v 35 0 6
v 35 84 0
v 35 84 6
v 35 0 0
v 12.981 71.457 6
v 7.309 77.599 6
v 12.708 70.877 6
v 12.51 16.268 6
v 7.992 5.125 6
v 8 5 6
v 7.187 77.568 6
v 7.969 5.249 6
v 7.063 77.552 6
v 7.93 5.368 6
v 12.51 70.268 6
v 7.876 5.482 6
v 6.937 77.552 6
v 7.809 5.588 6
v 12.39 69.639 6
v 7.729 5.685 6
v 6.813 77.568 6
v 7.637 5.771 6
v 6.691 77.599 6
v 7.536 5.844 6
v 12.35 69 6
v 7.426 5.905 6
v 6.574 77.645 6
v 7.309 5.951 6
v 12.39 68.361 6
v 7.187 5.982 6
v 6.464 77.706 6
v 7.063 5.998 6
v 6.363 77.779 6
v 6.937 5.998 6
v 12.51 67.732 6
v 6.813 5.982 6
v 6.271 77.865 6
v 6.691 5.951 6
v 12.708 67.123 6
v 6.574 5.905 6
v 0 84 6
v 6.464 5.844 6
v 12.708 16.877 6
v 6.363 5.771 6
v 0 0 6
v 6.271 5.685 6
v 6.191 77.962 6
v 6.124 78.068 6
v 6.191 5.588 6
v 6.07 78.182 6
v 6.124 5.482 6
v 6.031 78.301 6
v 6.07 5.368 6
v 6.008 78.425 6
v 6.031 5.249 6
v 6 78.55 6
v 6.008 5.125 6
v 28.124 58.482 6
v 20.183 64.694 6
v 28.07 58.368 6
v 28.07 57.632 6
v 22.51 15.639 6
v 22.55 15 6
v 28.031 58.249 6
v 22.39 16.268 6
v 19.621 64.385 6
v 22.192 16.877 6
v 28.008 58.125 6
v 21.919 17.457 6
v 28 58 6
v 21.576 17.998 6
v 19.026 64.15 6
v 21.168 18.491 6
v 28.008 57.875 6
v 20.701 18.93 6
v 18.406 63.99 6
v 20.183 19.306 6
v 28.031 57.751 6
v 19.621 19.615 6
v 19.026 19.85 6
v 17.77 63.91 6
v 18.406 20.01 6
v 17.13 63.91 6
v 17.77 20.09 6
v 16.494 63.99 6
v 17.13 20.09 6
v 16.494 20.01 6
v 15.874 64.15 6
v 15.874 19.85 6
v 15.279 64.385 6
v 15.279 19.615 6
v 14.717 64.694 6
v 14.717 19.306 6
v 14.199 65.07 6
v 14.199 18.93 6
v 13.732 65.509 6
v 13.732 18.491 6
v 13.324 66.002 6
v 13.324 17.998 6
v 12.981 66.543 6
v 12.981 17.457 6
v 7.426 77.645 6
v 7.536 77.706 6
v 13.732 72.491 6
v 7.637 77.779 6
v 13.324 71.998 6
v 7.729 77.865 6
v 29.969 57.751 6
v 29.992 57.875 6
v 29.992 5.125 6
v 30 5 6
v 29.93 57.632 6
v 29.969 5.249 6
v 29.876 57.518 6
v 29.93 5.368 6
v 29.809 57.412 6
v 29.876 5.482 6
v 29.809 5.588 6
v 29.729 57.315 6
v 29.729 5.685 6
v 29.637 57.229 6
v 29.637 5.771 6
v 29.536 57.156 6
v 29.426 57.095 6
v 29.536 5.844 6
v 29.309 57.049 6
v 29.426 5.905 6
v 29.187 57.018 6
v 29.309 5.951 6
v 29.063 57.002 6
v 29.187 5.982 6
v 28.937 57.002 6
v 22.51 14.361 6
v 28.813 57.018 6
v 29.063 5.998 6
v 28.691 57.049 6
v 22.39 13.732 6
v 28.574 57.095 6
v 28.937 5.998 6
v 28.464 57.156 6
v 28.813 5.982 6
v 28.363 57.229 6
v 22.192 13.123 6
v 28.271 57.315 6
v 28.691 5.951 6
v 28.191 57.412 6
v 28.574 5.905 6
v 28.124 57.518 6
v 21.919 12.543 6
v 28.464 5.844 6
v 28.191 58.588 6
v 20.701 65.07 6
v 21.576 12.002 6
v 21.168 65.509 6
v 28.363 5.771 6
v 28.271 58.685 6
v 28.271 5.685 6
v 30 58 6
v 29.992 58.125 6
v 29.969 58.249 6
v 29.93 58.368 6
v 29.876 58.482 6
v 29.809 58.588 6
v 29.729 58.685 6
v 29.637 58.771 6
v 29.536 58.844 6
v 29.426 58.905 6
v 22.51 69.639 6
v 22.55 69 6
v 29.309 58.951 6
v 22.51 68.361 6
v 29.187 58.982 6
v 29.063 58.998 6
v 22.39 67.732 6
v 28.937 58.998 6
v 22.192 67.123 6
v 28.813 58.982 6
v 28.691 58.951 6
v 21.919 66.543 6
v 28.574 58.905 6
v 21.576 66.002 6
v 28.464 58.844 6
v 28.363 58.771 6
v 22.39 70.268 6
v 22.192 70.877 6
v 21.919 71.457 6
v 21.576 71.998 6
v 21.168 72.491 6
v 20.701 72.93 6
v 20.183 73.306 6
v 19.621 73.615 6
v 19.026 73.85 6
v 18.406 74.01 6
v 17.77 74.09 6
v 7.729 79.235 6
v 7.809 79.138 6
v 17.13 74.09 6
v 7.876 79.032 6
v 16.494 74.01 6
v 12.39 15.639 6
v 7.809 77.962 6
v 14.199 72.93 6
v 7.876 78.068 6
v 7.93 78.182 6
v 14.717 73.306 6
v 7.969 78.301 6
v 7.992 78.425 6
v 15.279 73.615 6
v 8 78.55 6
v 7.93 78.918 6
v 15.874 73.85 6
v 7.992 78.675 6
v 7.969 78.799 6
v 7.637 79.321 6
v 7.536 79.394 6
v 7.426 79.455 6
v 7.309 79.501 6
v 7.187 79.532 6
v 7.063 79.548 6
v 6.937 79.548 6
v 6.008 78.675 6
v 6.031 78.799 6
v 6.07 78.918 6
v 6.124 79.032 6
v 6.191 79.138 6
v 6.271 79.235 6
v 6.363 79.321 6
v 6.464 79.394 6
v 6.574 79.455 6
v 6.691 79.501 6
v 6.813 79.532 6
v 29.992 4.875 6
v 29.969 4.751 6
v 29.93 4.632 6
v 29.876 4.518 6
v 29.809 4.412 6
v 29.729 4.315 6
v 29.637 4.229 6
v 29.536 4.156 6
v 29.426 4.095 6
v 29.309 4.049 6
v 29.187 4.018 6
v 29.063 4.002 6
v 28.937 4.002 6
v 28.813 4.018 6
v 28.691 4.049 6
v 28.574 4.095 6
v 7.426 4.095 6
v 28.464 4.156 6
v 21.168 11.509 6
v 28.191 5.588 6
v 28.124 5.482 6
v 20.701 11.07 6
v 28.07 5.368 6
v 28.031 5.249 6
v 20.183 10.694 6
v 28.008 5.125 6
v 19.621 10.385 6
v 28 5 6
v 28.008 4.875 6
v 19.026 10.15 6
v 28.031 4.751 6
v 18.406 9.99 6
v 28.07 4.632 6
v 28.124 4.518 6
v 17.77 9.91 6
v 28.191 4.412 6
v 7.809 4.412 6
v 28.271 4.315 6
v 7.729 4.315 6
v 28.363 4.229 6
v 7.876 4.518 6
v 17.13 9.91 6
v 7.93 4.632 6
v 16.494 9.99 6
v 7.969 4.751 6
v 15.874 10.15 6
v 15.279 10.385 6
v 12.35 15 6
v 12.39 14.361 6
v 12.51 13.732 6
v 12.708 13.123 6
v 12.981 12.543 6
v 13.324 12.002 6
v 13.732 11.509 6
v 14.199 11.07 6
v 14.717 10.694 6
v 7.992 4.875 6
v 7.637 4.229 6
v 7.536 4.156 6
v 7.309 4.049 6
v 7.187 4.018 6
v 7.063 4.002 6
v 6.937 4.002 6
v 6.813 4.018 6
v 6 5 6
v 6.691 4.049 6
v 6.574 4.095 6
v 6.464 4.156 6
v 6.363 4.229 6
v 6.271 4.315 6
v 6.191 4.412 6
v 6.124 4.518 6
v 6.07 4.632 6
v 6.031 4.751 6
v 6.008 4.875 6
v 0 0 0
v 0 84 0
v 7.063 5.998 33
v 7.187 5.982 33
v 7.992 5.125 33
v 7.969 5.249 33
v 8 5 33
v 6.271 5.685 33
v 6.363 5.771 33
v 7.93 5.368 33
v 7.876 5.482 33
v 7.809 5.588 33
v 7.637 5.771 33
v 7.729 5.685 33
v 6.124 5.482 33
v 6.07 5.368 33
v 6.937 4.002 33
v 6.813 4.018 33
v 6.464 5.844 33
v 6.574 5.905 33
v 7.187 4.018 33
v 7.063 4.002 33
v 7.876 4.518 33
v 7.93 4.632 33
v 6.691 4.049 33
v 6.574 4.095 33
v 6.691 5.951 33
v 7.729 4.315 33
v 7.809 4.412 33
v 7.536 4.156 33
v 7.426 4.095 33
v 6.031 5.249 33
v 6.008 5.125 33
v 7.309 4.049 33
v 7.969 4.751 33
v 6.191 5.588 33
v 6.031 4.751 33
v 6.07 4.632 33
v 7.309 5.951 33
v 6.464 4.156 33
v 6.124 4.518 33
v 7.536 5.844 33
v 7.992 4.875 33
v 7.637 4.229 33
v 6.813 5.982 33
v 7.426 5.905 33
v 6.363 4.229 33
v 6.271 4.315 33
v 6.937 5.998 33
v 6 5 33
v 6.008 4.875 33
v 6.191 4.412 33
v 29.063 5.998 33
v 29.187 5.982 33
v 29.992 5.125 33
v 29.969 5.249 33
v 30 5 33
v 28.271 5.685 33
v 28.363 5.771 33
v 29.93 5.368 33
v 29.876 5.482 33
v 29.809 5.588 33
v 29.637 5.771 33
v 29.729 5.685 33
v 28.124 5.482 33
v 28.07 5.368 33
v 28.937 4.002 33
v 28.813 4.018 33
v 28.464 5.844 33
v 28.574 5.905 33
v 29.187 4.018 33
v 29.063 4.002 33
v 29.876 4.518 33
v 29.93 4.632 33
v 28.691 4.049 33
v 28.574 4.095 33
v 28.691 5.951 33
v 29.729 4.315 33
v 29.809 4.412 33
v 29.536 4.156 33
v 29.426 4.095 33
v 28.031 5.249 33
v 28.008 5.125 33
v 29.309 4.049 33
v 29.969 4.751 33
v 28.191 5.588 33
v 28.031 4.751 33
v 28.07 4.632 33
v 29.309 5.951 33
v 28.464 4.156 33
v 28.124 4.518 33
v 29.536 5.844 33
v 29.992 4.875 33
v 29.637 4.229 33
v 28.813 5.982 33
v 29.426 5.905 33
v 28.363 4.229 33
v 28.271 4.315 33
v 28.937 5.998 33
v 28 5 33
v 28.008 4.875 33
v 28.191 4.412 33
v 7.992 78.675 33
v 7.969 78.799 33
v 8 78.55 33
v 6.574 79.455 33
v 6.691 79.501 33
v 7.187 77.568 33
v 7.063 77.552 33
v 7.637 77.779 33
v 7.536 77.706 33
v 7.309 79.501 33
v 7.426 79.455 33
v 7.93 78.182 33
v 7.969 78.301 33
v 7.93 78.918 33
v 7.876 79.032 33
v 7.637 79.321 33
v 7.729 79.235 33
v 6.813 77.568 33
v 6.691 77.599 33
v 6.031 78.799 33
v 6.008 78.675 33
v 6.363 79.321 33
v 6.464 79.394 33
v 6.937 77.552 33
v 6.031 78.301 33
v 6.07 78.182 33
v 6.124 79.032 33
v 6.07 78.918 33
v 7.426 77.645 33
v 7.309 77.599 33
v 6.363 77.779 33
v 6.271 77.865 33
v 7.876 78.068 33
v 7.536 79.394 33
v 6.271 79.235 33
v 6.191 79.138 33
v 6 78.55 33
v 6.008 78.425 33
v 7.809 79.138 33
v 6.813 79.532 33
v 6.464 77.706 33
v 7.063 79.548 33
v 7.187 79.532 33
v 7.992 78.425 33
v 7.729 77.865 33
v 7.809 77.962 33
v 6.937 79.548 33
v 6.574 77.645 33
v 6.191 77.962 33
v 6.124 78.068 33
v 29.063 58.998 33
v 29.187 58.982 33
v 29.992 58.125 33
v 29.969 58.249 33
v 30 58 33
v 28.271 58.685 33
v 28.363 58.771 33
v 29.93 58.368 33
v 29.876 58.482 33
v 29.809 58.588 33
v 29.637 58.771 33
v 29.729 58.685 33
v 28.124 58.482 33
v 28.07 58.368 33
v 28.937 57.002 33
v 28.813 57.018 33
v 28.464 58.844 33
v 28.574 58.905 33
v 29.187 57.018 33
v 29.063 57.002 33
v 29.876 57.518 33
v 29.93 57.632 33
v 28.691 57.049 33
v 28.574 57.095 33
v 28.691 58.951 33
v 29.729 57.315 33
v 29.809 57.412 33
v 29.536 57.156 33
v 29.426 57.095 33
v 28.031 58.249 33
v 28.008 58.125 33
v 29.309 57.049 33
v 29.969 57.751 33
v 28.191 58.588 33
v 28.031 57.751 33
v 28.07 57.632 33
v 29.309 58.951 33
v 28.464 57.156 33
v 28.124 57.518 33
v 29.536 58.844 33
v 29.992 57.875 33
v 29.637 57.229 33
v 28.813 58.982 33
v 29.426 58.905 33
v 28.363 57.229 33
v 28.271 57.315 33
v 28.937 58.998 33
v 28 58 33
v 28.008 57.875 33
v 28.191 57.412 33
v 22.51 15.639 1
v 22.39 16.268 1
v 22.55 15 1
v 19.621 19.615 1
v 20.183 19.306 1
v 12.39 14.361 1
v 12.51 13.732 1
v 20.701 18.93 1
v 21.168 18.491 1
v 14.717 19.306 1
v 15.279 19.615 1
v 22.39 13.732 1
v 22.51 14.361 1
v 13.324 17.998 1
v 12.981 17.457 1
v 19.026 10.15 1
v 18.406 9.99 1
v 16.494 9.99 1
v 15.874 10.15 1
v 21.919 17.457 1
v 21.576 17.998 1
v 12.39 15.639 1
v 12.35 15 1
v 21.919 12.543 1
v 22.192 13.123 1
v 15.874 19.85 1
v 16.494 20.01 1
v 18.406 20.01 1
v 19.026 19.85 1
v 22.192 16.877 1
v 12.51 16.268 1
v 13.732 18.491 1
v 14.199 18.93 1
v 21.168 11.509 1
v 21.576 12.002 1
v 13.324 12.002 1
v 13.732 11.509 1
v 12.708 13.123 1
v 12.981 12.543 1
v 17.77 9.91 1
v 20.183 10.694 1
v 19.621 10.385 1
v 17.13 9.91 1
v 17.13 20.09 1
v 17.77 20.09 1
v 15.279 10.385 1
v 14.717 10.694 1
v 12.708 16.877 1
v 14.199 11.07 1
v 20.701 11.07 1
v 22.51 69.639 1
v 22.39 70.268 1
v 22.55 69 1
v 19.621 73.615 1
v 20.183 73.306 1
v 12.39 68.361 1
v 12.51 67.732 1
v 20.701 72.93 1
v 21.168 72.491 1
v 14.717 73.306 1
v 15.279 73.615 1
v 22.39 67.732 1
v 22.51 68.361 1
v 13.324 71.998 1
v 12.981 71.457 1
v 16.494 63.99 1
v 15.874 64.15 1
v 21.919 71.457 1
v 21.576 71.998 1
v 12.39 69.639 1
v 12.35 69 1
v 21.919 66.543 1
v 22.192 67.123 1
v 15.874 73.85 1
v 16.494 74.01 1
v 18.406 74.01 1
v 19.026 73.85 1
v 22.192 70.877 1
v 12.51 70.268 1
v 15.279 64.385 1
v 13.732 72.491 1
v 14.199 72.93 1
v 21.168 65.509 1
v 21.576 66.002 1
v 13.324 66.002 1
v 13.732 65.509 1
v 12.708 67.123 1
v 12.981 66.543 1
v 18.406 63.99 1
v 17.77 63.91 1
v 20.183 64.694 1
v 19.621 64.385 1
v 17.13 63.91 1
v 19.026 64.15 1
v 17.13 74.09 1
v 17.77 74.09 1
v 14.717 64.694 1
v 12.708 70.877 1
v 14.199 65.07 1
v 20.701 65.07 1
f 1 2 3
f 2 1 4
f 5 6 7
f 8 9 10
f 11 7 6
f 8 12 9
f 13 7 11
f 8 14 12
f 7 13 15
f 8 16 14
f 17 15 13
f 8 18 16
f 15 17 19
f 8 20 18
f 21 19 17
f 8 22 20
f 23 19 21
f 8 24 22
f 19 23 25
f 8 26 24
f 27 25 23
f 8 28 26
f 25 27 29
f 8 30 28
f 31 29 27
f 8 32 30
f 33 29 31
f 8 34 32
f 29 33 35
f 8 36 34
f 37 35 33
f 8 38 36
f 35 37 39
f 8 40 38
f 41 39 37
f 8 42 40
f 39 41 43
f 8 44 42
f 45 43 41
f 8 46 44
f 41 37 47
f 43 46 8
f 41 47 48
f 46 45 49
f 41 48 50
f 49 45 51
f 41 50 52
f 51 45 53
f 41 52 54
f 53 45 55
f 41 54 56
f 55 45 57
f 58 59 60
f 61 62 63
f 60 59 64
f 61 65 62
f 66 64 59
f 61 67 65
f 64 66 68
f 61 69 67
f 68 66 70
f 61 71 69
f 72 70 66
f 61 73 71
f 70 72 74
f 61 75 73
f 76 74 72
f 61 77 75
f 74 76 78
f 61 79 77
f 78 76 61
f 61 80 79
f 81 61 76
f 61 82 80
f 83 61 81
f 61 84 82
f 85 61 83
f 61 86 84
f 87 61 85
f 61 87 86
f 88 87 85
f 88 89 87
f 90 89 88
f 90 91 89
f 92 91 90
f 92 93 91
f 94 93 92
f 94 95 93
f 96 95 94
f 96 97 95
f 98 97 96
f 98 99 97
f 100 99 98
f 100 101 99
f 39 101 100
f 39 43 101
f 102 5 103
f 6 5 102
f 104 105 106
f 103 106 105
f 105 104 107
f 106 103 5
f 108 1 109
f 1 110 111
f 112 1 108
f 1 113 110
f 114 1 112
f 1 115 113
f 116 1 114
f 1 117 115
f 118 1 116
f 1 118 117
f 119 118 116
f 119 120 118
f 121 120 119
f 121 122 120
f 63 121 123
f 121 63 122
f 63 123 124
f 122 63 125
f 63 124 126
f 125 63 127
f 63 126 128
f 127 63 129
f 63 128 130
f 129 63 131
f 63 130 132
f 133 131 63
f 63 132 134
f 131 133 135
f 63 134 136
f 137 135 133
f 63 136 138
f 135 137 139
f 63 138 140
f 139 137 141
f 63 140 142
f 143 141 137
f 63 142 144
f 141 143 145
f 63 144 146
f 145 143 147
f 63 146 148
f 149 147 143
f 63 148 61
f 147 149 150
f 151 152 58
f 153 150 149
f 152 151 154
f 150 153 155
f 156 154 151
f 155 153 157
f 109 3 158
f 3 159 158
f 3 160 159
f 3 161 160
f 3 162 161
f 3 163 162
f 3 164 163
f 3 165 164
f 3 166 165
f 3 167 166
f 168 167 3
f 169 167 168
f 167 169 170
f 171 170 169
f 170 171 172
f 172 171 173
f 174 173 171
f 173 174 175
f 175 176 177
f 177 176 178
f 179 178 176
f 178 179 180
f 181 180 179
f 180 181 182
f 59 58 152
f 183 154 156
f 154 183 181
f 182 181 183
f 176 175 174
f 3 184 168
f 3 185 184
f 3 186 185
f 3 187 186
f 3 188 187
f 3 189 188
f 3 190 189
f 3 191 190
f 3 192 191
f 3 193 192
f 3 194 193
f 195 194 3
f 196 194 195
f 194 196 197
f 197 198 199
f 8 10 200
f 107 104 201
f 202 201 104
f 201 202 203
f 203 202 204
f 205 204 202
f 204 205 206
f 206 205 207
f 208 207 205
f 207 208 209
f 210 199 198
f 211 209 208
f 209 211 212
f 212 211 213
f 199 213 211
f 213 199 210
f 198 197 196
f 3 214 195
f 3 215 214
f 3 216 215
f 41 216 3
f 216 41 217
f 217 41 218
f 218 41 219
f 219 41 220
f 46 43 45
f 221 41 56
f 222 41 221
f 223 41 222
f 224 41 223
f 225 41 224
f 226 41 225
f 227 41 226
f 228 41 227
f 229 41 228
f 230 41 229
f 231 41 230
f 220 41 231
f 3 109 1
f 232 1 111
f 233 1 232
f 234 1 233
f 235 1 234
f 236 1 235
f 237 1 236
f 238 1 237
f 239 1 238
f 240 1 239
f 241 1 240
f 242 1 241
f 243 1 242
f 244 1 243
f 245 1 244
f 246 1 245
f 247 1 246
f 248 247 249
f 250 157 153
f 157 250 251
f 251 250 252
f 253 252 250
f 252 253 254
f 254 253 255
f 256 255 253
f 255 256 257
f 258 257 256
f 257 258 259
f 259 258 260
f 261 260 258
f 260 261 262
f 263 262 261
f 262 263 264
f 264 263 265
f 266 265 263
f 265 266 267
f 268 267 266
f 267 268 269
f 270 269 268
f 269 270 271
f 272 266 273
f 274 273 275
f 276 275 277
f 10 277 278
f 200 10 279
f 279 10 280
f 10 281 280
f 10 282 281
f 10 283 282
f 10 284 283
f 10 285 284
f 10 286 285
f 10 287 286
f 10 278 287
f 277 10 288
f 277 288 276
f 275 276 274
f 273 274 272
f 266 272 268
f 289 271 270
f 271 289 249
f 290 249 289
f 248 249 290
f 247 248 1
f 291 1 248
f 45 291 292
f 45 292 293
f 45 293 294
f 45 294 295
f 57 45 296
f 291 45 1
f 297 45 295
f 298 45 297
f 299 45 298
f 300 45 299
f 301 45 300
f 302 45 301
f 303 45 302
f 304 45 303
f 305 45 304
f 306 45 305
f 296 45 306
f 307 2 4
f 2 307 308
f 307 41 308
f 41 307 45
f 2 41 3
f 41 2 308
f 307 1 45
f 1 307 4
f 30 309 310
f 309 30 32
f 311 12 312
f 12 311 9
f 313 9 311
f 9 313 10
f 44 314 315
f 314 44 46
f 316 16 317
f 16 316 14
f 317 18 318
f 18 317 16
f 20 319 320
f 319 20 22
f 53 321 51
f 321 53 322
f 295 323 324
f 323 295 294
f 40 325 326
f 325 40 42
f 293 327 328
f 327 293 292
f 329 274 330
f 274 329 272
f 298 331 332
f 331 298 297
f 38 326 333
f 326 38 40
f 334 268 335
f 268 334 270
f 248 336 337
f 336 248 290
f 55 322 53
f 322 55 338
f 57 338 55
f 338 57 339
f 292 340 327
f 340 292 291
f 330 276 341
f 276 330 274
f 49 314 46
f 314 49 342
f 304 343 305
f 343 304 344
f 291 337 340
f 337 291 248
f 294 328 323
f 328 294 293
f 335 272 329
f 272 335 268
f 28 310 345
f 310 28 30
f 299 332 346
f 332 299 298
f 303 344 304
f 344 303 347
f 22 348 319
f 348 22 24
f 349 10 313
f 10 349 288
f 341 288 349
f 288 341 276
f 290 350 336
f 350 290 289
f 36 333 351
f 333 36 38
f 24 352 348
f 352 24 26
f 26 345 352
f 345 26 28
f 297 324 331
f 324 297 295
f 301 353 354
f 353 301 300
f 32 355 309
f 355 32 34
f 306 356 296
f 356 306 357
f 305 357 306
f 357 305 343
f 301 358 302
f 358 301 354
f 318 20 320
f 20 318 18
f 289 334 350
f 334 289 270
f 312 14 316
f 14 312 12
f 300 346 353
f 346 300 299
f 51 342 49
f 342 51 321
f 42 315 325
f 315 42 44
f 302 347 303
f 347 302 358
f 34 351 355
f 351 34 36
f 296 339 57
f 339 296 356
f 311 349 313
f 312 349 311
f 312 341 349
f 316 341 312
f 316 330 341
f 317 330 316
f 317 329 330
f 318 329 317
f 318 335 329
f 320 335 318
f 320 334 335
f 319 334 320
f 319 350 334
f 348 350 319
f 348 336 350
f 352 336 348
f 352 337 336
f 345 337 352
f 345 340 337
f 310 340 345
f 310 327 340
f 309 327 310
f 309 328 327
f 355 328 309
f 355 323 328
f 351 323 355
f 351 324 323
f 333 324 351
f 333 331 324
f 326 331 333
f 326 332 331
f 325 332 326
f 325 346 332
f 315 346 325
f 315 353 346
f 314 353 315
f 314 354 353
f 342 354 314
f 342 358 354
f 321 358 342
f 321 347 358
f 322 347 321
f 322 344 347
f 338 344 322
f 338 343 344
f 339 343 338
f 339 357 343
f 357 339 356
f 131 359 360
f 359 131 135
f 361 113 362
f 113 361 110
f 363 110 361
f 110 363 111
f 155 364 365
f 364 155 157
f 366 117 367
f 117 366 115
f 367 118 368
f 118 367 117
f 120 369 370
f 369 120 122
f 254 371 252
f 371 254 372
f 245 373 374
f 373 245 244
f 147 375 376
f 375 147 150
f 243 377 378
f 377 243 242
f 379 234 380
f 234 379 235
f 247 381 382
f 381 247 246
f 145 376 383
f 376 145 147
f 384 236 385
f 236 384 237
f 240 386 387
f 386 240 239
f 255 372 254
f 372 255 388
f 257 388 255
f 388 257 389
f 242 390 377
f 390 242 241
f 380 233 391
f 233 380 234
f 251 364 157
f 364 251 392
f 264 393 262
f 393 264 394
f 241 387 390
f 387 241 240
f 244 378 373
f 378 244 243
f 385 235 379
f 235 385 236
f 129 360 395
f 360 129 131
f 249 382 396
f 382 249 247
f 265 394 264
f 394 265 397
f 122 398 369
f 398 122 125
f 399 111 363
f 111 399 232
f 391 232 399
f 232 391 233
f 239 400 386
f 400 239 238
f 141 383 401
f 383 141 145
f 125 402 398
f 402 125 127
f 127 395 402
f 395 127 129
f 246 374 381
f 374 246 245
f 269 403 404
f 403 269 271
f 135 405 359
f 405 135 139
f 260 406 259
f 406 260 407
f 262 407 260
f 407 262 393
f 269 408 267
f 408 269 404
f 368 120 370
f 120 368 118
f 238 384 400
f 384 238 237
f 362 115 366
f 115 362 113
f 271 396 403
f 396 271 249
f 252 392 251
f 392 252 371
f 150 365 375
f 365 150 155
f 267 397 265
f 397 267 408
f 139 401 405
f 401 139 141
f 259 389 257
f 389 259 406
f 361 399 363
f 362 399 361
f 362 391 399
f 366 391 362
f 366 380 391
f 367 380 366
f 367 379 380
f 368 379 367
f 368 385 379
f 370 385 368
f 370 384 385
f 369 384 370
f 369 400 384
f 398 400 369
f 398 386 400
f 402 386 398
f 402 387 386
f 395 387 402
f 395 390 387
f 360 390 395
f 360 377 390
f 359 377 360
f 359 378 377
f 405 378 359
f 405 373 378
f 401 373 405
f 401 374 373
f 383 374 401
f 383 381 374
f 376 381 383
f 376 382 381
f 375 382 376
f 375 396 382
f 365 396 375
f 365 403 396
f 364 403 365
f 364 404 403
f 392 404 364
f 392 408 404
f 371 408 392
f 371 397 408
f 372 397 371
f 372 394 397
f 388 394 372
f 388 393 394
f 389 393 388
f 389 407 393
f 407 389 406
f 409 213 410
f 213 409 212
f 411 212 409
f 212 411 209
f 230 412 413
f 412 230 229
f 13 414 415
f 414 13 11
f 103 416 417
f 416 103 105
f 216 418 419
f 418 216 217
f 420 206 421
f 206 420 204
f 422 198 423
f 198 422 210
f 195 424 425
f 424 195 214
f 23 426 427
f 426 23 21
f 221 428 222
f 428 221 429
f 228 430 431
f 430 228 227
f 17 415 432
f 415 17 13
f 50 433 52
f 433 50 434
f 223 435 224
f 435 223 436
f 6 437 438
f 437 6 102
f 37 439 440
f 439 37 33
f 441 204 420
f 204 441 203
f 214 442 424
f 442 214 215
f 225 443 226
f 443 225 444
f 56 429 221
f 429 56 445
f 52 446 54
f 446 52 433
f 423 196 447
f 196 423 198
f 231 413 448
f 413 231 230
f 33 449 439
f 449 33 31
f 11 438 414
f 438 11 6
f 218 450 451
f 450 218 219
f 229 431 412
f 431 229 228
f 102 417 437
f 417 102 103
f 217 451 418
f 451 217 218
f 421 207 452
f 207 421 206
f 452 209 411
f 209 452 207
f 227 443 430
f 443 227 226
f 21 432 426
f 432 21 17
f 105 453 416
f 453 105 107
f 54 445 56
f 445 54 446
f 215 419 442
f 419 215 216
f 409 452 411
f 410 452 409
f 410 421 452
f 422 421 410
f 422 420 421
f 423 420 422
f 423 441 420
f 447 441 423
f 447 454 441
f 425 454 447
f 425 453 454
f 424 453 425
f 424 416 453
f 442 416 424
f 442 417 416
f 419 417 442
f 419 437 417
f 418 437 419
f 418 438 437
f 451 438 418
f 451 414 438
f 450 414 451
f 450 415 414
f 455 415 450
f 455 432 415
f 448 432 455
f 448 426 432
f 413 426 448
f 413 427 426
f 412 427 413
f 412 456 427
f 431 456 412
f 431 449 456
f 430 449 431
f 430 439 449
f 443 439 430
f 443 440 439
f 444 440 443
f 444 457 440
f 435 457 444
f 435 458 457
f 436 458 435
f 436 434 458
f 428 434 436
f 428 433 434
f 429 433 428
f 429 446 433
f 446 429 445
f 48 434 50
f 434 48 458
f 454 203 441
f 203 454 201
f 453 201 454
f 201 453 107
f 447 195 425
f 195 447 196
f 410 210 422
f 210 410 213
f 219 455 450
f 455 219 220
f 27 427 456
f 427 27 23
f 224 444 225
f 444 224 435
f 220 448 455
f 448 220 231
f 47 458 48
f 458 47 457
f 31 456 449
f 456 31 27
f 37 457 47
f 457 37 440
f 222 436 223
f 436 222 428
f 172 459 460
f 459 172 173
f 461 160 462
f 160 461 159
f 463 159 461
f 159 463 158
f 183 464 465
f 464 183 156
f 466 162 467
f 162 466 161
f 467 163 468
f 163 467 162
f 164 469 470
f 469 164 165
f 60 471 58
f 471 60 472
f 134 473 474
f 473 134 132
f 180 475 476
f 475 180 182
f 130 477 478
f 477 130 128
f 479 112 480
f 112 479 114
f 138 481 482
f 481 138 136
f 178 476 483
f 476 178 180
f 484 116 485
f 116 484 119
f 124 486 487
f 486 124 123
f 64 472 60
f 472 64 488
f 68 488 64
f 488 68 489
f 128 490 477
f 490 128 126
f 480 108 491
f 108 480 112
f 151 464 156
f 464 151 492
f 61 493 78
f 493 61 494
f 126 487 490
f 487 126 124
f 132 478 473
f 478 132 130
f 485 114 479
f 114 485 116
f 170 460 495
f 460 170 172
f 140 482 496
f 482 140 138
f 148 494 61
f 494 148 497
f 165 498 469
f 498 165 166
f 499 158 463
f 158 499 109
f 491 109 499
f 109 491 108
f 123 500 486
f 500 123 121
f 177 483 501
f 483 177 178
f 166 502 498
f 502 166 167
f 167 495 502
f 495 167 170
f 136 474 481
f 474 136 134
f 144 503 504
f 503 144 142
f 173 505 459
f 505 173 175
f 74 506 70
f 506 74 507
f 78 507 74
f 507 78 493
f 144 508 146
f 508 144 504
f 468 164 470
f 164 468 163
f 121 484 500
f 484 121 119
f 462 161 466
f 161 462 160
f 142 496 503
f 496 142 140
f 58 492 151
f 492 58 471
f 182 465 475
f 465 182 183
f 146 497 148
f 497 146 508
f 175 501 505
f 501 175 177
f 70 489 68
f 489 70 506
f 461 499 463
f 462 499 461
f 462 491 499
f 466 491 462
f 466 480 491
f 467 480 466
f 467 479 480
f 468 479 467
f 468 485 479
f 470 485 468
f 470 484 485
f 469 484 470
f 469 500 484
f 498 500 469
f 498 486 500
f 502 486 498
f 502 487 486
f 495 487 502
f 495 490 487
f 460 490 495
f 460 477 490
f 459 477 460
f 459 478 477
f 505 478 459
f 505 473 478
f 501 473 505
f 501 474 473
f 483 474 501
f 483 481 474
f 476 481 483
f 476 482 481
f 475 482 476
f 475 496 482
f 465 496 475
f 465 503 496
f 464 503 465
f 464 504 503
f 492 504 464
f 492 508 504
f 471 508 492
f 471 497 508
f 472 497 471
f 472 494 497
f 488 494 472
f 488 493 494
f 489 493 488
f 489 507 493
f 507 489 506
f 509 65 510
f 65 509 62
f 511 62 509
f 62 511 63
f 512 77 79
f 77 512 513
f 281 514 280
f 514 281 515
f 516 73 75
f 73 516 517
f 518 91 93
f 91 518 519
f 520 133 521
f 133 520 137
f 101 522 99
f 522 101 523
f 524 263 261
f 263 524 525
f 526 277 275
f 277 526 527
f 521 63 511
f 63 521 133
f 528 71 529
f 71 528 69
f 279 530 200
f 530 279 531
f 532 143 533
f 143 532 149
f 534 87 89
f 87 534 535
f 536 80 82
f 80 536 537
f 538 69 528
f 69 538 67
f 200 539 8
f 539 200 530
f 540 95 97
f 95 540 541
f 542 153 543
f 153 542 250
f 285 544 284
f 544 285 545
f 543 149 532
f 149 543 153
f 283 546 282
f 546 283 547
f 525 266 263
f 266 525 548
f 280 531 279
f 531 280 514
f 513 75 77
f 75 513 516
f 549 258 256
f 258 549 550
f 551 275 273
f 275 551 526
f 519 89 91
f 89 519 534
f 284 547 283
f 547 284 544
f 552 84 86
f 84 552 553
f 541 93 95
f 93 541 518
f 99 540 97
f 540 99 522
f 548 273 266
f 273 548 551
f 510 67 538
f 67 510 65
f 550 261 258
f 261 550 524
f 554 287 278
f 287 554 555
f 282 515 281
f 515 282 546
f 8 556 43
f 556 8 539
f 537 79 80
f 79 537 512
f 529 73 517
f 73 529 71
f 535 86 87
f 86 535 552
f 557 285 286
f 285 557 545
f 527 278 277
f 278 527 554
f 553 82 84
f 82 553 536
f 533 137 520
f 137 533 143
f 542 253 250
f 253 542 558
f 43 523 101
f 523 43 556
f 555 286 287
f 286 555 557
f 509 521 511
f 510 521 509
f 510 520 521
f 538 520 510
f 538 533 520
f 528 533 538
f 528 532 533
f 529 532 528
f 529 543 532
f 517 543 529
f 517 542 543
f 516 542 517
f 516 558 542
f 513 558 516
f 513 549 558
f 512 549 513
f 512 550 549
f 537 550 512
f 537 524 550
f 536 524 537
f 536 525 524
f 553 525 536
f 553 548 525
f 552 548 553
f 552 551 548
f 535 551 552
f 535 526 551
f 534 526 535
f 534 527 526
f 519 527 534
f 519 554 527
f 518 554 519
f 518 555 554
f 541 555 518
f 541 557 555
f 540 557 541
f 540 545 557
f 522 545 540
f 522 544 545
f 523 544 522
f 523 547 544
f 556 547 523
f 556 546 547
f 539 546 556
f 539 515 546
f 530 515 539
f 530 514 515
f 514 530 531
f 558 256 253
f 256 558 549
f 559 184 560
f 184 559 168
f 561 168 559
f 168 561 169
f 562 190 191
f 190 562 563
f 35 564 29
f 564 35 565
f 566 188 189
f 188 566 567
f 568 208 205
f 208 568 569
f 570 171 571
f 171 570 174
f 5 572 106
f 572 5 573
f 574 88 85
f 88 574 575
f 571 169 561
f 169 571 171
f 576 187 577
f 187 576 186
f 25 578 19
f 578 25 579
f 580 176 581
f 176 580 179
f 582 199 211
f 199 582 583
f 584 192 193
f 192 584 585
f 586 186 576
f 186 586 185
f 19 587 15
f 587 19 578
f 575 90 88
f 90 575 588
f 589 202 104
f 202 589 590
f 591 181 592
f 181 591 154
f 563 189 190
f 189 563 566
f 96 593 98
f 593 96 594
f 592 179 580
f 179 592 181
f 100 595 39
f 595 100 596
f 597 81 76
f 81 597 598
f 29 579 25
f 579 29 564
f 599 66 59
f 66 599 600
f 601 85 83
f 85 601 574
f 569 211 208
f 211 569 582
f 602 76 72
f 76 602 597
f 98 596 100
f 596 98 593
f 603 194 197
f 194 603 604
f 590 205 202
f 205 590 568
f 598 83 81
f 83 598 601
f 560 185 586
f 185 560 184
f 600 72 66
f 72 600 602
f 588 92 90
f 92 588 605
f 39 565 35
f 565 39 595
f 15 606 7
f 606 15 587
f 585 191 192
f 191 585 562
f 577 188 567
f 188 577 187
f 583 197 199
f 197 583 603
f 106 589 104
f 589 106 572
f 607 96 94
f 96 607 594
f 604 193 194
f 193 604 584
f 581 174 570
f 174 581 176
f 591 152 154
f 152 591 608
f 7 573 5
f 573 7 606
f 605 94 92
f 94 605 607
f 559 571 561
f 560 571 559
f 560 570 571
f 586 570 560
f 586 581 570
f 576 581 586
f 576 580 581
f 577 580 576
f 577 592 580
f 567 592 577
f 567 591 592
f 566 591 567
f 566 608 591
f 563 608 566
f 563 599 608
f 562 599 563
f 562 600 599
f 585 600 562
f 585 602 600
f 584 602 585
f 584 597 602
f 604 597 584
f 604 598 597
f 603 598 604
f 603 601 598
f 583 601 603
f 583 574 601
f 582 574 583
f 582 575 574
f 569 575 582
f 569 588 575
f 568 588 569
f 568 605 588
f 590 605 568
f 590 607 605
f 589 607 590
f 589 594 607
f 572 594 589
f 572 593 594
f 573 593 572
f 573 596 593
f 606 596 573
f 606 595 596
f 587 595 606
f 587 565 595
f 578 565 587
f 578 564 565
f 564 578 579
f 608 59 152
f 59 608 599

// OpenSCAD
$fa = 1;
$fs = 0.5;
$fn = 50;

post_h = 32;

difference() {
  union() {
    cube([35,84,6]);
    // together side posts
    translate([7, 5, 1]) cylinder(h=post_h, r=1);
    translate([29, 5, 1]) cylinder(h=post_h, r=1);
    // not together side posts
    translate([7, 78.55, 1]) cylinder(h=post_h, r=1);
    translate([29, 58, 1]) cylinder(h=post_h, r=1);
  }
  // magnetic holes
  translate([17.45, 15, 1]) cylinder(h=10, r=5.1);
  translate([17.45, 84-15, 1]) cylinder(h=10, r=5.1);
}
